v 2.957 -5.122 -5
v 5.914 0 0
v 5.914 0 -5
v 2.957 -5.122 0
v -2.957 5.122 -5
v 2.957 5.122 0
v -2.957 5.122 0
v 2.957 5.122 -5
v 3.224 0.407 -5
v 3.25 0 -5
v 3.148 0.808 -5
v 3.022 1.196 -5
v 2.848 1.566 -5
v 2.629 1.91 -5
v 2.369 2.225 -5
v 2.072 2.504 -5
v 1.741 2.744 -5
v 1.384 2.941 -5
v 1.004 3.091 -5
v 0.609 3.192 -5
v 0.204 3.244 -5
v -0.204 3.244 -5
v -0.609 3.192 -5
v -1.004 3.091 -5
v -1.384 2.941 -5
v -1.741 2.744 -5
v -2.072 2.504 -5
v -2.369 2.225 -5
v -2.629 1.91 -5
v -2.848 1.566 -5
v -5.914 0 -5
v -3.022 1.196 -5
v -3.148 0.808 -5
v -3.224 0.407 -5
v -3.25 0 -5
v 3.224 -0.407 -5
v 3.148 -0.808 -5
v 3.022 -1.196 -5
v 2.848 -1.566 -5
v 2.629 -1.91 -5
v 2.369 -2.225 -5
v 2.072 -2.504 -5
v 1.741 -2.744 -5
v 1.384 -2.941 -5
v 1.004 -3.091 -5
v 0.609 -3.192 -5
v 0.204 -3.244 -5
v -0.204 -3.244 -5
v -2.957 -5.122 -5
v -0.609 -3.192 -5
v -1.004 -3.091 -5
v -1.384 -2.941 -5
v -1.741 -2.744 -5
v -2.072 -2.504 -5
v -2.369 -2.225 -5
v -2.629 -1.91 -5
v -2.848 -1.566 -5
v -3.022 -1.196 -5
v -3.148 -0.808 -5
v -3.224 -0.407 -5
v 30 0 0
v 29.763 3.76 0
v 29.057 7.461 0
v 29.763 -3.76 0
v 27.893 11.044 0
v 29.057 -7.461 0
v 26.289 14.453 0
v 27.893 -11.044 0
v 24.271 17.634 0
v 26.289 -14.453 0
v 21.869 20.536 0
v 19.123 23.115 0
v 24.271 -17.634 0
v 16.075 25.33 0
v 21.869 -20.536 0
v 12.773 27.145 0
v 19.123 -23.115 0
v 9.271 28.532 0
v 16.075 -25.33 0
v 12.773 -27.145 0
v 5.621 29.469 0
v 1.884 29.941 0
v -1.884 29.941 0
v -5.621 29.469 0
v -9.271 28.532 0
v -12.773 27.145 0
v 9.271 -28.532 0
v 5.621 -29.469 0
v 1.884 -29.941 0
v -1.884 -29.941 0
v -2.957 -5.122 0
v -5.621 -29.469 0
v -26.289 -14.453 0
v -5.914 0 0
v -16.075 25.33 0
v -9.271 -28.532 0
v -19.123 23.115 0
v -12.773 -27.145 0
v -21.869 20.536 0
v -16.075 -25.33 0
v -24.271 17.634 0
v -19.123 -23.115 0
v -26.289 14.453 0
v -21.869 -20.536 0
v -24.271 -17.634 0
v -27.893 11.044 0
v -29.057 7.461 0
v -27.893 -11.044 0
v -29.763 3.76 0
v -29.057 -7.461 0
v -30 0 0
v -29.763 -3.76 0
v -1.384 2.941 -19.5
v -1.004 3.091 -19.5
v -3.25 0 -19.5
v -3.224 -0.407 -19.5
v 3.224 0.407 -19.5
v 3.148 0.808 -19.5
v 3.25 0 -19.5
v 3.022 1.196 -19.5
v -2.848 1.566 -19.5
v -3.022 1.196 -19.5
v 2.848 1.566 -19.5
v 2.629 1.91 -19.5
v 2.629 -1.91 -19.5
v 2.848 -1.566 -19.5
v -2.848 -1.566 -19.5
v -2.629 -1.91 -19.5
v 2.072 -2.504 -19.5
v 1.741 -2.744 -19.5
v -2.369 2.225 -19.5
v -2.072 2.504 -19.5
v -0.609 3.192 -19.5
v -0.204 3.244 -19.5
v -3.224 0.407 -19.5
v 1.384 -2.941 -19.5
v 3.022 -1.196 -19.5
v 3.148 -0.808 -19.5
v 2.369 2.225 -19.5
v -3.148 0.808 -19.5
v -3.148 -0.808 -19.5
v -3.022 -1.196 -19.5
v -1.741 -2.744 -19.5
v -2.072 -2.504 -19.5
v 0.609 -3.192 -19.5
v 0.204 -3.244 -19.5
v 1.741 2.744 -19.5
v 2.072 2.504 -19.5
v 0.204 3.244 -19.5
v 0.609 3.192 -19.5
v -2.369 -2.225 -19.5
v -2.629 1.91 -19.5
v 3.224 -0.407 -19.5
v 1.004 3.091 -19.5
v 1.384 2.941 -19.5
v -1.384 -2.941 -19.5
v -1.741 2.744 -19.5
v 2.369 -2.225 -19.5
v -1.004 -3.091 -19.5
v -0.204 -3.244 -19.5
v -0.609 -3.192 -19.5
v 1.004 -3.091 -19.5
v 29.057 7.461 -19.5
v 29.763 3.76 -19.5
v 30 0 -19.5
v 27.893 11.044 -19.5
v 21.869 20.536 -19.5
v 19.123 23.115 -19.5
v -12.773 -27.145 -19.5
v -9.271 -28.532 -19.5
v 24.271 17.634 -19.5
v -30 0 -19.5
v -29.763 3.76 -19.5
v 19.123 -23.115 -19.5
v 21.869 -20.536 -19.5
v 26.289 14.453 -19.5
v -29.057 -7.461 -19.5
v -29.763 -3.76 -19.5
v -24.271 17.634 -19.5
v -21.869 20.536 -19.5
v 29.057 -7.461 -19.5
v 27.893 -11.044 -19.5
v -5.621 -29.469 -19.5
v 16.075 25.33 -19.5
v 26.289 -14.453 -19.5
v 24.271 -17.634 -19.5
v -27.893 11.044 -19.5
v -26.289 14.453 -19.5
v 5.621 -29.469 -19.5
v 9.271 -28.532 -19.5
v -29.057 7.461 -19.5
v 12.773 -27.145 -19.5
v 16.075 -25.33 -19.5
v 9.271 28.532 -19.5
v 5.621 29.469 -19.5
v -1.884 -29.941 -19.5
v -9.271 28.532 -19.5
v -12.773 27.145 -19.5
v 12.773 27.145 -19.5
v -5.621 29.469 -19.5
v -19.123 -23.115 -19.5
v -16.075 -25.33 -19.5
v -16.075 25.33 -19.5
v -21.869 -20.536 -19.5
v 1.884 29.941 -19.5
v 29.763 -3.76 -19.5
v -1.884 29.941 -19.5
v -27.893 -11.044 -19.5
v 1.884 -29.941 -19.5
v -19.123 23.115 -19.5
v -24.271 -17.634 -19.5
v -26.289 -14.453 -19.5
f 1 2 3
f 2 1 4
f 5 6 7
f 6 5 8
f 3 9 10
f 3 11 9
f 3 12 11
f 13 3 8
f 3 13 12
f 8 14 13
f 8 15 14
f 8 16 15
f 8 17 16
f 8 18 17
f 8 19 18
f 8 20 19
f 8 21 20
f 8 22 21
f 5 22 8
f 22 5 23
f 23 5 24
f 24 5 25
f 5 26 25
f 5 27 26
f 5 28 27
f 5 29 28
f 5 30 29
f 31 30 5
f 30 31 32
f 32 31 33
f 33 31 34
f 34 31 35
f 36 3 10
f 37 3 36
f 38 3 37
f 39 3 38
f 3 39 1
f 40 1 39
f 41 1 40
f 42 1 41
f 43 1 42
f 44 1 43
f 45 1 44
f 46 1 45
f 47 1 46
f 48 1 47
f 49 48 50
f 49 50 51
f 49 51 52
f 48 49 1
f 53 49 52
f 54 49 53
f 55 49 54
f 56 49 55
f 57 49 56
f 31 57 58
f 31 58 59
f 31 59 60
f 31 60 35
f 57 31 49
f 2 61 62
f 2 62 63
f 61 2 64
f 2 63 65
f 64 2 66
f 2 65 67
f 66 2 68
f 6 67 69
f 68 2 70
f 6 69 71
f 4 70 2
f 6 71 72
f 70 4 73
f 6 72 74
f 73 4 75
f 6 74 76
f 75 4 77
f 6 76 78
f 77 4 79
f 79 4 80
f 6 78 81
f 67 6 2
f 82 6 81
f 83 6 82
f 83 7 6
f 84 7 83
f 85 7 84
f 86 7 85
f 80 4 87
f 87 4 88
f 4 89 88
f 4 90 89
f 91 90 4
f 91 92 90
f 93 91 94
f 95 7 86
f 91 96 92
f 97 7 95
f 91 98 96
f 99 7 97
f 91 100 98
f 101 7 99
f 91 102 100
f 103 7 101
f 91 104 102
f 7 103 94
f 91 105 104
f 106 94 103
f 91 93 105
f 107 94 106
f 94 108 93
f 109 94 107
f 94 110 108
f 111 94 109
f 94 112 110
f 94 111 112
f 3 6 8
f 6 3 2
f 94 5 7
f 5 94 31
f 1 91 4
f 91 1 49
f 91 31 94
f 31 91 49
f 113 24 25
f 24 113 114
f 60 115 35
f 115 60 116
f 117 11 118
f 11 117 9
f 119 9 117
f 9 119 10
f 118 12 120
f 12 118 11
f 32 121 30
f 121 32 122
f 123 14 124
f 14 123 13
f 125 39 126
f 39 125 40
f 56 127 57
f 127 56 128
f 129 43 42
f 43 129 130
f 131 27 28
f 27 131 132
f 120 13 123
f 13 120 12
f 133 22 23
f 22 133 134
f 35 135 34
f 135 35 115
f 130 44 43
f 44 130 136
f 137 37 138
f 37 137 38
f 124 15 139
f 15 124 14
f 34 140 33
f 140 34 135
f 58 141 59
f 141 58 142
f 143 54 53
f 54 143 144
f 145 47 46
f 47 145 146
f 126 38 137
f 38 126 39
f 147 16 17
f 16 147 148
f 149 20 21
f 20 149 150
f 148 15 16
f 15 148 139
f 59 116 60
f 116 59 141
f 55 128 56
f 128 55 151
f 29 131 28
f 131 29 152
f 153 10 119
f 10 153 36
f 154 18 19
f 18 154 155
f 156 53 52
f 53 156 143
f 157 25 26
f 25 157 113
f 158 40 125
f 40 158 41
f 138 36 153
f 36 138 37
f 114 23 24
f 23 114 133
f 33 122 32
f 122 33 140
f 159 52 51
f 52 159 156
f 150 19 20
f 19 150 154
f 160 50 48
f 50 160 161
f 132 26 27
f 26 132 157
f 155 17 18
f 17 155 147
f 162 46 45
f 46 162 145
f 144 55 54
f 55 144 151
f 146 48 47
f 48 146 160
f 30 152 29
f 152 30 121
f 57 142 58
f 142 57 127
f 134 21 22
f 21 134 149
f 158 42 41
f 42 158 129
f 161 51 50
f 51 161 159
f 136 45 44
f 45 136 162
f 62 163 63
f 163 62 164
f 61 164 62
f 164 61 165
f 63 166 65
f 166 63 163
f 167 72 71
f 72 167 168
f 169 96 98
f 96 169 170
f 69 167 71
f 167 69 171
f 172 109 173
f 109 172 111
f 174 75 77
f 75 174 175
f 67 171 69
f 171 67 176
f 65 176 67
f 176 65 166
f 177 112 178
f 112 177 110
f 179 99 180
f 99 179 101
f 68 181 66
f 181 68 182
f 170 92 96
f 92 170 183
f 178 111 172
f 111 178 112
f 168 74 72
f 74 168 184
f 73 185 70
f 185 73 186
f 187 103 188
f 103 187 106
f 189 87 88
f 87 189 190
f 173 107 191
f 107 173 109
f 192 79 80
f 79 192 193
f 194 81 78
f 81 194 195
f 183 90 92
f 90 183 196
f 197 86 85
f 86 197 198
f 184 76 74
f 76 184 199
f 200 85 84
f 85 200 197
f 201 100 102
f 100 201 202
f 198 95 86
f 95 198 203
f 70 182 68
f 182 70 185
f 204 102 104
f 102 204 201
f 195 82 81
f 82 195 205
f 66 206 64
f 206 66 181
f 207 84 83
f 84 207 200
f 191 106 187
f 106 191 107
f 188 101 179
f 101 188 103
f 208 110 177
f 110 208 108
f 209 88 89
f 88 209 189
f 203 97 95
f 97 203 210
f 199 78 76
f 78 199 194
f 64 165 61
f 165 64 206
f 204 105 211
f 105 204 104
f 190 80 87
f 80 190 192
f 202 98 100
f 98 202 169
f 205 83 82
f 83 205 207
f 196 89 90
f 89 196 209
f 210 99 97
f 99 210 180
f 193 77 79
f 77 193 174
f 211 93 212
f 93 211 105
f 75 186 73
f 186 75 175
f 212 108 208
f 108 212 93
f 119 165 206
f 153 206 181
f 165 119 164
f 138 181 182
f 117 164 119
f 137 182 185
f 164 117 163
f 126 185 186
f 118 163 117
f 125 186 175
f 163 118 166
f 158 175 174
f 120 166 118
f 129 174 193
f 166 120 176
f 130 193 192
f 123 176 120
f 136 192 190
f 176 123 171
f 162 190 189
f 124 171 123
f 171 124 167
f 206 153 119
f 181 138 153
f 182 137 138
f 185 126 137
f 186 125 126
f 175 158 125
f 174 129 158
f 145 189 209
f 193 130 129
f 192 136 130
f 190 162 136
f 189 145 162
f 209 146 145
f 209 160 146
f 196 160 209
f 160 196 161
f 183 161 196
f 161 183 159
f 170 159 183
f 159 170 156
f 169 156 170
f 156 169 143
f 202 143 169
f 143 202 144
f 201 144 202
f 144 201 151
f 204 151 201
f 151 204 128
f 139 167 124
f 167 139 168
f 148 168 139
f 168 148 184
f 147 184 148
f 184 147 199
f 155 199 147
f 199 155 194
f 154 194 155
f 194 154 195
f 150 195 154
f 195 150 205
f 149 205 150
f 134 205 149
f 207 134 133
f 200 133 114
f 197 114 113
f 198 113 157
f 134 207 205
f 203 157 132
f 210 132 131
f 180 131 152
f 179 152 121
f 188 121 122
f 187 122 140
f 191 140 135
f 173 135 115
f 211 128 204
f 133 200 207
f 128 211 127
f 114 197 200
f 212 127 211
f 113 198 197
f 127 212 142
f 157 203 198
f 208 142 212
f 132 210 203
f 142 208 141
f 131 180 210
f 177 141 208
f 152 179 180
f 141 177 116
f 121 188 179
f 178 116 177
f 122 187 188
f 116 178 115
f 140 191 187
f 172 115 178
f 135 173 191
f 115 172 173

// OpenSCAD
$fn = 50;

difference() {
	union() {
		translate(v = [0, 0, -19.5]) {
			cylinder(h = 19.5, r = 30.0);
		}
	}
	union() {
		translate(v = [0, 0, 0]) {
			rotate(a = [0, 0, 0]) {
				difference() {
					union() {
						translate(v = [0, 0, -5]) {
							linear_extrude(height = 5) {
								polygon(points = [[5.914249999999999, 0.0], [2.957125, 5.1218907443321156], [-2.9571249999999982, 5.1218907443321156], [-5.914249999999999, 7.242867331857232e-16], [-2.9571250000000022, -5.121890744332115], [2.9571249999999956, -5.121890744332118]]);
							}
						}
					}
					union();
				}
			}
		}
		#translate(v = [0, 0, -100.0]) {
			cylinder(h = 200, r = 3.25);
		}
	}
}
